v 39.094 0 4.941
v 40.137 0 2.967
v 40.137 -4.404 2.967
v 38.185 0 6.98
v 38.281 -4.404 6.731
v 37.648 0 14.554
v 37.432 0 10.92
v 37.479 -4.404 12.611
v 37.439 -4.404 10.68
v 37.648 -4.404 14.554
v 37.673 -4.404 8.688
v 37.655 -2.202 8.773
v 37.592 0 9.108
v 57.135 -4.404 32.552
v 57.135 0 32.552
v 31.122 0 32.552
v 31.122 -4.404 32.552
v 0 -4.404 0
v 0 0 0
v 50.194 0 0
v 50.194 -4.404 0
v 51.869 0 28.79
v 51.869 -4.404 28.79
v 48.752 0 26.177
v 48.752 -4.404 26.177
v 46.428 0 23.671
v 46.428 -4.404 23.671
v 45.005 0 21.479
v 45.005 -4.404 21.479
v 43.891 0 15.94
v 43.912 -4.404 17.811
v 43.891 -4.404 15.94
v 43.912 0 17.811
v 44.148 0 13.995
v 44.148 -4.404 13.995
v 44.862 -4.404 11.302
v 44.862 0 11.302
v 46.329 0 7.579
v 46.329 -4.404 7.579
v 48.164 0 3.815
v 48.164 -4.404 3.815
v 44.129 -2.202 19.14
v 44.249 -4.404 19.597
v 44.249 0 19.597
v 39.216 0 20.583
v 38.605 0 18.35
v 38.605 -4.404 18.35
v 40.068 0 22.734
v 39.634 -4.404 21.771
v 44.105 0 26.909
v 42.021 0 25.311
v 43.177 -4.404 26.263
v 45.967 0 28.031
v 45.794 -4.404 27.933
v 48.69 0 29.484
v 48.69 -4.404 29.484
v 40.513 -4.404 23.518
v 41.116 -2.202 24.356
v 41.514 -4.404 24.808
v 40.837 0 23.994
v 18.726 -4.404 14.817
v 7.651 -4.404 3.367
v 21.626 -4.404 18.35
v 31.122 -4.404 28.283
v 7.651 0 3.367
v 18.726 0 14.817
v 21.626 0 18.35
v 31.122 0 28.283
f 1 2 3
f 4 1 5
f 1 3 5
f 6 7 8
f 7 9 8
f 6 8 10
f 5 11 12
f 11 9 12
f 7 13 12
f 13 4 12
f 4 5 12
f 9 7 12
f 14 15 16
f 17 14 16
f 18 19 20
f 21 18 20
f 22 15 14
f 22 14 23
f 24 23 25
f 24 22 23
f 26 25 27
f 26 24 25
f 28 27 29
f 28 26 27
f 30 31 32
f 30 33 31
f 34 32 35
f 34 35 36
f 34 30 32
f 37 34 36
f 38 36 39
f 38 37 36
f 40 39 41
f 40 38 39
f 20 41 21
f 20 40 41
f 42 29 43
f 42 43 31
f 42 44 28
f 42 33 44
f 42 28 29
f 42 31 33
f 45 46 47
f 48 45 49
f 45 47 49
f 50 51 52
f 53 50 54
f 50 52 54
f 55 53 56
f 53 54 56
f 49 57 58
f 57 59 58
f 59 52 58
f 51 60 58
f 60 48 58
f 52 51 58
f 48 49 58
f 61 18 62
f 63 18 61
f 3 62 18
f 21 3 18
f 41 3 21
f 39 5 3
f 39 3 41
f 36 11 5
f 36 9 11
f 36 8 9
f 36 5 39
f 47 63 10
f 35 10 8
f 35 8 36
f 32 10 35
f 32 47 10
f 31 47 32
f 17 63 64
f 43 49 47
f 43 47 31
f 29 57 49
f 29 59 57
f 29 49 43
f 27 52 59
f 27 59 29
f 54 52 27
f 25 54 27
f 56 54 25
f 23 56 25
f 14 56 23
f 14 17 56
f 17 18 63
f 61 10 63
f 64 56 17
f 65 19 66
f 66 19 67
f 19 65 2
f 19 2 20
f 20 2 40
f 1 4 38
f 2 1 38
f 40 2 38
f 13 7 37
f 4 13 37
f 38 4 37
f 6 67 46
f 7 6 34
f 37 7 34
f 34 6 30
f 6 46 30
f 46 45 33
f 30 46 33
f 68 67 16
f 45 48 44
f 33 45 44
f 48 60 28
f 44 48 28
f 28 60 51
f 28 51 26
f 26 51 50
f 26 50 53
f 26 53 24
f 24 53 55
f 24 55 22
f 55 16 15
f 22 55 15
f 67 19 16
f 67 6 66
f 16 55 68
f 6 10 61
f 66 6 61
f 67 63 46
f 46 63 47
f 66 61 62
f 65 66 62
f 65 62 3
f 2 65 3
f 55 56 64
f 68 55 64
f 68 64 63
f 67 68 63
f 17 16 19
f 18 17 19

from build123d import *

# Parameters (mm, degrees)
F4_DEPTH = 4.4038286433
F1_DEPTH = 25.4
F3_DEPTH = 25.4


with BuildPart() as f4:
    # F0 (on Front) → F4 (new body)
    with BuildSketch(Plane.XZ):
        with BuildLine():
            Line((31.1220660806, 32.5515791774), (0, 0))
            Line((0, 0), (50.1943454146, 0))
            add(Edge.make_bspline(
                [(57.1354404092, 32.5515791774), (51.2567108227, 28.4945148136), (39.283604536, 20.231564454), (46.5140247255, 6.824346213), (50.1943454146, 0)],
                knots=[0, 0, 0, 0, 0.4909946095, 1, 1, 1, 1], degree=3))
            Line((57.1354404092, 32.5515791774), (31.1220660806, 32.5515791774))
        make_face()
    extrude(amount=F4_DEPTH)

    # F5 (on face) → F1 (cut)
    with BuildSketch(Plane.XZ.offset(4.4038286433)):
        with BuildLine():
            Line((48.6895032227, 29.4836014509), (31.1220660806, 28.2830670476))
            Line((31.1220660806, 28.2830670476), (21.6255090178, 18.3503097448))
            Line((21.6255090178, 18.3503097448), (38.6046469212, 18.3503097448))
            add(Edge.make_bspline(
                [(38.6046469212, 18.3503097448), (39.1462333934, 20.4801539657), (40.329776692, 25.1345605855), (45.7497139994, 27.9542141002), (48.6895032227, 29.4836014509)],
                knots=[0, 0, 0, 0, 0.4575973734, 1, 1, 1, 1], degree=3))
        make_face()
    extrude(amount=-F1_DEPTH, mode=Mode.SUBTRACT)

    # F2 (on face) → F3 (cut)
    with BuildSketch(Plane.XZ.offset(4.4038286433)):
        with BuildLine():
            Line((37.6483798027, 14.5543171093), (18.7260732055, 14.8174436763))
            Line((18.7260732055, 14.8174436763), (7.6506421901, 3.3673320431))
            Line((7.6506421901, 3.3673320431), (40.1368737221, 2.9665562324))
            add(Edge.make_bspline(
                [(40.1368737221, 2.9665562324), (39.0989015719, 4.8818670377), (37.0677097284, 8.6299096625), (37.4576869265, 12.6087358362), (37.6483798027, 14.5543171093)],
                knots=[0, 0, 0, 0, 0.5110162974, 1, 1, 1, 1], degree=3))
        make_face()
    extrude(amount=-F3_DEPTH, mode=Mode.SUBTRACT)


solid = f4.part
